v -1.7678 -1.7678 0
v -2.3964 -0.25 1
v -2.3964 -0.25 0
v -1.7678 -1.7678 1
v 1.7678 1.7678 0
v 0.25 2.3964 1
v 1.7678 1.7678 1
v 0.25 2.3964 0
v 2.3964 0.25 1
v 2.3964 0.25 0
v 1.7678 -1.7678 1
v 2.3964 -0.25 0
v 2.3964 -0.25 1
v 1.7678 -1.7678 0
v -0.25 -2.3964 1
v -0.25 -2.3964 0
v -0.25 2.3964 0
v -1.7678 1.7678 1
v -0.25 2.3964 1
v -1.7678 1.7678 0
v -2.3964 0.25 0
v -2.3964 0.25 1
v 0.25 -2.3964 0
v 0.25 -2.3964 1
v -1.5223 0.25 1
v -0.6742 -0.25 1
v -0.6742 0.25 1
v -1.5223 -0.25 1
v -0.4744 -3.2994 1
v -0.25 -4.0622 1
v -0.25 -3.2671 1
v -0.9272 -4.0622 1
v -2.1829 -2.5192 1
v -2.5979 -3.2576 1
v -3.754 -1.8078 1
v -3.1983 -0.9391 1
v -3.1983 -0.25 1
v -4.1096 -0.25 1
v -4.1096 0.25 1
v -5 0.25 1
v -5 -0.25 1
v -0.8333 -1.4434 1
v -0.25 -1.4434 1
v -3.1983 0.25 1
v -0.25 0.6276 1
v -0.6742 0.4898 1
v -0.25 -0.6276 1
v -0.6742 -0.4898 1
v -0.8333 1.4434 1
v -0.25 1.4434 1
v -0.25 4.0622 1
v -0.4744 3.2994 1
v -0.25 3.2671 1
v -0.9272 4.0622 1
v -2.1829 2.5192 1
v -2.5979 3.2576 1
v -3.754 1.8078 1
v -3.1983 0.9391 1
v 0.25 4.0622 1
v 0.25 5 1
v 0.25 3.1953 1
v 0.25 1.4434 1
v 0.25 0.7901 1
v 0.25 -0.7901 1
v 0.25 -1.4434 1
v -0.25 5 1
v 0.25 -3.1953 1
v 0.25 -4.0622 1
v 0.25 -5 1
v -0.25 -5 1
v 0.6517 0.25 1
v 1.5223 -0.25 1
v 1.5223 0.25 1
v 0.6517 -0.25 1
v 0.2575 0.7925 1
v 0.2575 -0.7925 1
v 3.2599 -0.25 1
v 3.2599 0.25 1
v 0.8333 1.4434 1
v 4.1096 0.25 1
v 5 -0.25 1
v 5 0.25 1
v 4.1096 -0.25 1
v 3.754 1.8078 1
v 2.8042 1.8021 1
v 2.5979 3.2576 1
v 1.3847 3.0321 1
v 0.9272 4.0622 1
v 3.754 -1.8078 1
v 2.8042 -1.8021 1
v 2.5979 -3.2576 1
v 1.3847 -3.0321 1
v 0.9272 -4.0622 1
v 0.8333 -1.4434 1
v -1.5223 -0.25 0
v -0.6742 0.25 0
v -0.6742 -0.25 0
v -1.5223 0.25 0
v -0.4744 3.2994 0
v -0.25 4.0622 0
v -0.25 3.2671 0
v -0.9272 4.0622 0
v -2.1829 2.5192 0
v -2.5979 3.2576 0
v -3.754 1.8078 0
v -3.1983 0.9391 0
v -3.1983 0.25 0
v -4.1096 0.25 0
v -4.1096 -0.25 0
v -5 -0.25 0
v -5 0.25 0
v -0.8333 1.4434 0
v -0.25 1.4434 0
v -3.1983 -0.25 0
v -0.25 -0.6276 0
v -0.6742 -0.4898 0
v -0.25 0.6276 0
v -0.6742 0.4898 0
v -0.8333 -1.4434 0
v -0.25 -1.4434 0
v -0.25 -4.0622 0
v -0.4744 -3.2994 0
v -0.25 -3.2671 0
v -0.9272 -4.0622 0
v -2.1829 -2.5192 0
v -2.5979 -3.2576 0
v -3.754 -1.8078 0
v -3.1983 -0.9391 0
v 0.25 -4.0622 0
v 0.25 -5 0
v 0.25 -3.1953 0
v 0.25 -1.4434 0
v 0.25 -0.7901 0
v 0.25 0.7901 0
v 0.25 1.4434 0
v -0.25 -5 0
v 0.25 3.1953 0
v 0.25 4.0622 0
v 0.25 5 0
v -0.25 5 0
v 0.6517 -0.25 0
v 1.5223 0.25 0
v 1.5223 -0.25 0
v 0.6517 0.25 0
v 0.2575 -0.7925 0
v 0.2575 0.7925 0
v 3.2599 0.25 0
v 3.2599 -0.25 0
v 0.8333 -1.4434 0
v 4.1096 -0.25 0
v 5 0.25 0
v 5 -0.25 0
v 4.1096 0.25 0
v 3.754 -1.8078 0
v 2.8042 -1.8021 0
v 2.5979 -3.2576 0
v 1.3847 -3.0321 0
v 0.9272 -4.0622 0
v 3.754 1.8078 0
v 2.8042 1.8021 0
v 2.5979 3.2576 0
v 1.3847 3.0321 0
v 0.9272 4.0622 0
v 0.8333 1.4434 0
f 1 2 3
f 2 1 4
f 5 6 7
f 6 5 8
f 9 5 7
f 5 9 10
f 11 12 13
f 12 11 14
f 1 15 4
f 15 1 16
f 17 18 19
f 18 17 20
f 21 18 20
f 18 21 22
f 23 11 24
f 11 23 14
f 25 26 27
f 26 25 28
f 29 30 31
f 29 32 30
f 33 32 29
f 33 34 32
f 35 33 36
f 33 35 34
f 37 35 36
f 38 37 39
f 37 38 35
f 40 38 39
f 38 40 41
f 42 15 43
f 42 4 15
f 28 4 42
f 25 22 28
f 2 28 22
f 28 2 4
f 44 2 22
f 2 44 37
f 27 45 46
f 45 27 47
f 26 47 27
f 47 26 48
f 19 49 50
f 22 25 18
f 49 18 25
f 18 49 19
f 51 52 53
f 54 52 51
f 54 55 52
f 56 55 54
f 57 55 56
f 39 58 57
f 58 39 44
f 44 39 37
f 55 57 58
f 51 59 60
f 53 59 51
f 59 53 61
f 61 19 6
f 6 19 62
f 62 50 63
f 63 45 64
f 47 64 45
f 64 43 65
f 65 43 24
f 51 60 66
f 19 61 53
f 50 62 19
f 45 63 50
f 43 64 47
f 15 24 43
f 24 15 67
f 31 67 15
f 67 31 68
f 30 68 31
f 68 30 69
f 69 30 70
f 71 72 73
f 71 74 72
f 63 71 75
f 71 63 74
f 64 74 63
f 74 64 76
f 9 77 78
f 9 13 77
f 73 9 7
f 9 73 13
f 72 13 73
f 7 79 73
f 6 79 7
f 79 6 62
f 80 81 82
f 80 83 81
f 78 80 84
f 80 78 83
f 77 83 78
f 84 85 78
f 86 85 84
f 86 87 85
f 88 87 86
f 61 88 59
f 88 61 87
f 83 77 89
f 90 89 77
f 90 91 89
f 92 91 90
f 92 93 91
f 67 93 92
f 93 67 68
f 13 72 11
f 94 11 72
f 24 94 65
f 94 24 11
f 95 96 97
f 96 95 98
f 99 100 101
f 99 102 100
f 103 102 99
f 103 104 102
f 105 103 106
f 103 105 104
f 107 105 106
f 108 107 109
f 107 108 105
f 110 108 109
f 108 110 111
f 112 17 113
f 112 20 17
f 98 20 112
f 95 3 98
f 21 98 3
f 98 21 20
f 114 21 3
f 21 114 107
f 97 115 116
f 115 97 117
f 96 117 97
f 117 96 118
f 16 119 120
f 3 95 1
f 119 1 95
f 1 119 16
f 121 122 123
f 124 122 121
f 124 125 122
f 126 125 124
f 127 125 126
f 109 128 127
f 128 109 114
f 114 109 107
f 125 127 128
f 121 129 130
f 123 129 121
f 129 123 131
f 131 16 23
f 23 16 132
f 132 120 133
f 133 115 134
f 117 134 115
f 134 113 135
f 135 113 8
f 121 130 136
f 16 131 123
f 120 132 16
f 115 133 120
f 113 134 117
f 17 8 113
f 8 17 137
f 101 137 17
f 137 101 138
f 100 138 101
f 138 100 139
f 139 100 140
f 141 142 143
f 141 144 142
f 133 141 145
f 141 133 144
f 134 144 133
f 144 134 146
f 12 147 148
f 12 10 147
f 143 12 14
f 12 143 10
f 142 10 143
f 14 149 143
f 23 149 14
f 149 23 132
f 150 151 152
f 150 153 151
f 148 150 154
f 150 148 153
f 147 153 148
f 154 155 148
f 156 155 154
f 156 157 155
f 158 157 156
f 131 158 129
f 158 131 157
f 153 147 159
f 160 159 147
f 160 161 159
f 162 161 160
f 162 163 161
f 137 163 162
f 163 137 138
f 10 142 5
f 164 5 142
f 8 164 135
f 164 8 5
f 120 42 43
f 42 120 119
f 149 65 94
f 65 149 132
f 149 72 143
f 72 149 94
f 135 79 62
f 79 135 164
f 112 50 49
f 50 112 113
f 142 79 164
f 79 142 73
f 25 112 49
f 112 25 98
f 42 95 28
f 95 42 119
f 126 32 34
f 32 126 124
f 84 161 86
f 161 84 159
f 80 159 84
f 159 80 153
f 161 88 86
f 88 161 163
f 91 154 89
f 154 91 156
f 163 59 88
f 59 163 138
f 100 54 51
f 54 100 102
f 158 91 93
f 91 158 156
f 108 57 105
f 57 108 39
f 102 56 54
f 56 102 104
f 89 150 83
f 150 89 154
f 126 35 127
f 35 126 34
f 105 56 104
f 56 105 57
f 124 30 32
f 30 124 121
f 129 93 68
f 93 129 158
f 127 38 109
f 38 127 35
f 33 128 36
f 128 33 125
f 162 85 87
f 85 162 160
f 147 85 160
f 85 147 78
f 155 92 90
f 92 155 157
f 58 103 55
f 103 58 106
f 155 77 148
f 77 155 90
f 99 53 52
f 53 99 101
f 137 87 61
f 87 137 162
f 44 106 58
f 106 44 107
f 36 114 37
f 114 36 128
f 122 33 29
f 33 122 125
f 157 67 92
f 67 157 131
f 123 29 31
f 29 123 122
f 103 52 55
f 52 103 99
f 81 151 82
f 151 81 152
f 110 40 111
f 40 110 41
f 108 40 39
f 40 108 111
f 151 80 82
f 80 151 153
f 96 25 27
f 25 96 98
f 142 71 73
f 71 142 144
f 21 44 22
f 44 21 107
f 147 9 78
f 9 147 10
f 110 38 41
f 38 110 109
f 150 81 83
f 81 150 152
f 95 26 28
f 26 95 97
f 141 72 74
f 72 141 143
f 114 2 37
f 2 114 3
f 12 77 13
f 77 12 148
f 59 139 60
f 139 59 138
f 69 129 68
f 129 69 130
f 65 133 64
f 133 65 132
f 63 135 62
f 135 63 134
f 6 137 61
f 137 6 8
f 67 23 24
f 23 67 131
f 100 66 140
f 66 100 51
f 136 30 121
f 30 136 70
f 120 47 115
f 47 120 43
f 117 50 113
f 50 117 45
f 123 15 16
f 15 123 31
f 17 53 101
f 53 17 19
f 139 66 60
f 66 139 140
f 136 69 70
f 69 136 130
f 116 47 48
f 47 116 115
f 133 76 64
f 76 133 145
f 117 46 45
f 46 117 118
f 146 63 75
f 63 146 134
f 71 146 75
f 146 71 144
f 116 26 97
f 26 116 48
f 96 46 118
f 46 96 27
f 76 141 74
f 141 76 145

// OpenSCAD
// draws a target symbol
// parameters:
// size - size of the symbol
// line_width - width of the drawing line
// height - height of the symbol (Z axis)
// centerX - if true, center horizontally
// centerY - if true, center vertically
// center - if true, center both horizontally and vertically
module target_symbol(size=10, line_width=0.5 ,height = 1, center=false, centerX=false, centerY=false) {
    
    targetFraction = size / 12;
        
    translate([center||centerX ? 0 : size/2 , center || centerY ? 0 : size/2, height/2]) {
       cube([size, line_width, height], center=true);
       cube([line_width, size, height], center=true);

        cylinder(h=height, r=targetFraction, center=true);
    
        difference() {
           cylinder(h=height, r=targetFraction*3, center=true);
           translate([0,0,-2]) 
             cylinder(h=height+4, r=targetFraction*2, center=true);
        }   
        
        difference() {
           cylinder(h=height, r=targetFraction*5, center=true);
           translate([0,0,-2]) 
             cylinder(h=height+4, r=targetFraction*4, center=true);
        }
   }
}

target_symbol(center=true);
